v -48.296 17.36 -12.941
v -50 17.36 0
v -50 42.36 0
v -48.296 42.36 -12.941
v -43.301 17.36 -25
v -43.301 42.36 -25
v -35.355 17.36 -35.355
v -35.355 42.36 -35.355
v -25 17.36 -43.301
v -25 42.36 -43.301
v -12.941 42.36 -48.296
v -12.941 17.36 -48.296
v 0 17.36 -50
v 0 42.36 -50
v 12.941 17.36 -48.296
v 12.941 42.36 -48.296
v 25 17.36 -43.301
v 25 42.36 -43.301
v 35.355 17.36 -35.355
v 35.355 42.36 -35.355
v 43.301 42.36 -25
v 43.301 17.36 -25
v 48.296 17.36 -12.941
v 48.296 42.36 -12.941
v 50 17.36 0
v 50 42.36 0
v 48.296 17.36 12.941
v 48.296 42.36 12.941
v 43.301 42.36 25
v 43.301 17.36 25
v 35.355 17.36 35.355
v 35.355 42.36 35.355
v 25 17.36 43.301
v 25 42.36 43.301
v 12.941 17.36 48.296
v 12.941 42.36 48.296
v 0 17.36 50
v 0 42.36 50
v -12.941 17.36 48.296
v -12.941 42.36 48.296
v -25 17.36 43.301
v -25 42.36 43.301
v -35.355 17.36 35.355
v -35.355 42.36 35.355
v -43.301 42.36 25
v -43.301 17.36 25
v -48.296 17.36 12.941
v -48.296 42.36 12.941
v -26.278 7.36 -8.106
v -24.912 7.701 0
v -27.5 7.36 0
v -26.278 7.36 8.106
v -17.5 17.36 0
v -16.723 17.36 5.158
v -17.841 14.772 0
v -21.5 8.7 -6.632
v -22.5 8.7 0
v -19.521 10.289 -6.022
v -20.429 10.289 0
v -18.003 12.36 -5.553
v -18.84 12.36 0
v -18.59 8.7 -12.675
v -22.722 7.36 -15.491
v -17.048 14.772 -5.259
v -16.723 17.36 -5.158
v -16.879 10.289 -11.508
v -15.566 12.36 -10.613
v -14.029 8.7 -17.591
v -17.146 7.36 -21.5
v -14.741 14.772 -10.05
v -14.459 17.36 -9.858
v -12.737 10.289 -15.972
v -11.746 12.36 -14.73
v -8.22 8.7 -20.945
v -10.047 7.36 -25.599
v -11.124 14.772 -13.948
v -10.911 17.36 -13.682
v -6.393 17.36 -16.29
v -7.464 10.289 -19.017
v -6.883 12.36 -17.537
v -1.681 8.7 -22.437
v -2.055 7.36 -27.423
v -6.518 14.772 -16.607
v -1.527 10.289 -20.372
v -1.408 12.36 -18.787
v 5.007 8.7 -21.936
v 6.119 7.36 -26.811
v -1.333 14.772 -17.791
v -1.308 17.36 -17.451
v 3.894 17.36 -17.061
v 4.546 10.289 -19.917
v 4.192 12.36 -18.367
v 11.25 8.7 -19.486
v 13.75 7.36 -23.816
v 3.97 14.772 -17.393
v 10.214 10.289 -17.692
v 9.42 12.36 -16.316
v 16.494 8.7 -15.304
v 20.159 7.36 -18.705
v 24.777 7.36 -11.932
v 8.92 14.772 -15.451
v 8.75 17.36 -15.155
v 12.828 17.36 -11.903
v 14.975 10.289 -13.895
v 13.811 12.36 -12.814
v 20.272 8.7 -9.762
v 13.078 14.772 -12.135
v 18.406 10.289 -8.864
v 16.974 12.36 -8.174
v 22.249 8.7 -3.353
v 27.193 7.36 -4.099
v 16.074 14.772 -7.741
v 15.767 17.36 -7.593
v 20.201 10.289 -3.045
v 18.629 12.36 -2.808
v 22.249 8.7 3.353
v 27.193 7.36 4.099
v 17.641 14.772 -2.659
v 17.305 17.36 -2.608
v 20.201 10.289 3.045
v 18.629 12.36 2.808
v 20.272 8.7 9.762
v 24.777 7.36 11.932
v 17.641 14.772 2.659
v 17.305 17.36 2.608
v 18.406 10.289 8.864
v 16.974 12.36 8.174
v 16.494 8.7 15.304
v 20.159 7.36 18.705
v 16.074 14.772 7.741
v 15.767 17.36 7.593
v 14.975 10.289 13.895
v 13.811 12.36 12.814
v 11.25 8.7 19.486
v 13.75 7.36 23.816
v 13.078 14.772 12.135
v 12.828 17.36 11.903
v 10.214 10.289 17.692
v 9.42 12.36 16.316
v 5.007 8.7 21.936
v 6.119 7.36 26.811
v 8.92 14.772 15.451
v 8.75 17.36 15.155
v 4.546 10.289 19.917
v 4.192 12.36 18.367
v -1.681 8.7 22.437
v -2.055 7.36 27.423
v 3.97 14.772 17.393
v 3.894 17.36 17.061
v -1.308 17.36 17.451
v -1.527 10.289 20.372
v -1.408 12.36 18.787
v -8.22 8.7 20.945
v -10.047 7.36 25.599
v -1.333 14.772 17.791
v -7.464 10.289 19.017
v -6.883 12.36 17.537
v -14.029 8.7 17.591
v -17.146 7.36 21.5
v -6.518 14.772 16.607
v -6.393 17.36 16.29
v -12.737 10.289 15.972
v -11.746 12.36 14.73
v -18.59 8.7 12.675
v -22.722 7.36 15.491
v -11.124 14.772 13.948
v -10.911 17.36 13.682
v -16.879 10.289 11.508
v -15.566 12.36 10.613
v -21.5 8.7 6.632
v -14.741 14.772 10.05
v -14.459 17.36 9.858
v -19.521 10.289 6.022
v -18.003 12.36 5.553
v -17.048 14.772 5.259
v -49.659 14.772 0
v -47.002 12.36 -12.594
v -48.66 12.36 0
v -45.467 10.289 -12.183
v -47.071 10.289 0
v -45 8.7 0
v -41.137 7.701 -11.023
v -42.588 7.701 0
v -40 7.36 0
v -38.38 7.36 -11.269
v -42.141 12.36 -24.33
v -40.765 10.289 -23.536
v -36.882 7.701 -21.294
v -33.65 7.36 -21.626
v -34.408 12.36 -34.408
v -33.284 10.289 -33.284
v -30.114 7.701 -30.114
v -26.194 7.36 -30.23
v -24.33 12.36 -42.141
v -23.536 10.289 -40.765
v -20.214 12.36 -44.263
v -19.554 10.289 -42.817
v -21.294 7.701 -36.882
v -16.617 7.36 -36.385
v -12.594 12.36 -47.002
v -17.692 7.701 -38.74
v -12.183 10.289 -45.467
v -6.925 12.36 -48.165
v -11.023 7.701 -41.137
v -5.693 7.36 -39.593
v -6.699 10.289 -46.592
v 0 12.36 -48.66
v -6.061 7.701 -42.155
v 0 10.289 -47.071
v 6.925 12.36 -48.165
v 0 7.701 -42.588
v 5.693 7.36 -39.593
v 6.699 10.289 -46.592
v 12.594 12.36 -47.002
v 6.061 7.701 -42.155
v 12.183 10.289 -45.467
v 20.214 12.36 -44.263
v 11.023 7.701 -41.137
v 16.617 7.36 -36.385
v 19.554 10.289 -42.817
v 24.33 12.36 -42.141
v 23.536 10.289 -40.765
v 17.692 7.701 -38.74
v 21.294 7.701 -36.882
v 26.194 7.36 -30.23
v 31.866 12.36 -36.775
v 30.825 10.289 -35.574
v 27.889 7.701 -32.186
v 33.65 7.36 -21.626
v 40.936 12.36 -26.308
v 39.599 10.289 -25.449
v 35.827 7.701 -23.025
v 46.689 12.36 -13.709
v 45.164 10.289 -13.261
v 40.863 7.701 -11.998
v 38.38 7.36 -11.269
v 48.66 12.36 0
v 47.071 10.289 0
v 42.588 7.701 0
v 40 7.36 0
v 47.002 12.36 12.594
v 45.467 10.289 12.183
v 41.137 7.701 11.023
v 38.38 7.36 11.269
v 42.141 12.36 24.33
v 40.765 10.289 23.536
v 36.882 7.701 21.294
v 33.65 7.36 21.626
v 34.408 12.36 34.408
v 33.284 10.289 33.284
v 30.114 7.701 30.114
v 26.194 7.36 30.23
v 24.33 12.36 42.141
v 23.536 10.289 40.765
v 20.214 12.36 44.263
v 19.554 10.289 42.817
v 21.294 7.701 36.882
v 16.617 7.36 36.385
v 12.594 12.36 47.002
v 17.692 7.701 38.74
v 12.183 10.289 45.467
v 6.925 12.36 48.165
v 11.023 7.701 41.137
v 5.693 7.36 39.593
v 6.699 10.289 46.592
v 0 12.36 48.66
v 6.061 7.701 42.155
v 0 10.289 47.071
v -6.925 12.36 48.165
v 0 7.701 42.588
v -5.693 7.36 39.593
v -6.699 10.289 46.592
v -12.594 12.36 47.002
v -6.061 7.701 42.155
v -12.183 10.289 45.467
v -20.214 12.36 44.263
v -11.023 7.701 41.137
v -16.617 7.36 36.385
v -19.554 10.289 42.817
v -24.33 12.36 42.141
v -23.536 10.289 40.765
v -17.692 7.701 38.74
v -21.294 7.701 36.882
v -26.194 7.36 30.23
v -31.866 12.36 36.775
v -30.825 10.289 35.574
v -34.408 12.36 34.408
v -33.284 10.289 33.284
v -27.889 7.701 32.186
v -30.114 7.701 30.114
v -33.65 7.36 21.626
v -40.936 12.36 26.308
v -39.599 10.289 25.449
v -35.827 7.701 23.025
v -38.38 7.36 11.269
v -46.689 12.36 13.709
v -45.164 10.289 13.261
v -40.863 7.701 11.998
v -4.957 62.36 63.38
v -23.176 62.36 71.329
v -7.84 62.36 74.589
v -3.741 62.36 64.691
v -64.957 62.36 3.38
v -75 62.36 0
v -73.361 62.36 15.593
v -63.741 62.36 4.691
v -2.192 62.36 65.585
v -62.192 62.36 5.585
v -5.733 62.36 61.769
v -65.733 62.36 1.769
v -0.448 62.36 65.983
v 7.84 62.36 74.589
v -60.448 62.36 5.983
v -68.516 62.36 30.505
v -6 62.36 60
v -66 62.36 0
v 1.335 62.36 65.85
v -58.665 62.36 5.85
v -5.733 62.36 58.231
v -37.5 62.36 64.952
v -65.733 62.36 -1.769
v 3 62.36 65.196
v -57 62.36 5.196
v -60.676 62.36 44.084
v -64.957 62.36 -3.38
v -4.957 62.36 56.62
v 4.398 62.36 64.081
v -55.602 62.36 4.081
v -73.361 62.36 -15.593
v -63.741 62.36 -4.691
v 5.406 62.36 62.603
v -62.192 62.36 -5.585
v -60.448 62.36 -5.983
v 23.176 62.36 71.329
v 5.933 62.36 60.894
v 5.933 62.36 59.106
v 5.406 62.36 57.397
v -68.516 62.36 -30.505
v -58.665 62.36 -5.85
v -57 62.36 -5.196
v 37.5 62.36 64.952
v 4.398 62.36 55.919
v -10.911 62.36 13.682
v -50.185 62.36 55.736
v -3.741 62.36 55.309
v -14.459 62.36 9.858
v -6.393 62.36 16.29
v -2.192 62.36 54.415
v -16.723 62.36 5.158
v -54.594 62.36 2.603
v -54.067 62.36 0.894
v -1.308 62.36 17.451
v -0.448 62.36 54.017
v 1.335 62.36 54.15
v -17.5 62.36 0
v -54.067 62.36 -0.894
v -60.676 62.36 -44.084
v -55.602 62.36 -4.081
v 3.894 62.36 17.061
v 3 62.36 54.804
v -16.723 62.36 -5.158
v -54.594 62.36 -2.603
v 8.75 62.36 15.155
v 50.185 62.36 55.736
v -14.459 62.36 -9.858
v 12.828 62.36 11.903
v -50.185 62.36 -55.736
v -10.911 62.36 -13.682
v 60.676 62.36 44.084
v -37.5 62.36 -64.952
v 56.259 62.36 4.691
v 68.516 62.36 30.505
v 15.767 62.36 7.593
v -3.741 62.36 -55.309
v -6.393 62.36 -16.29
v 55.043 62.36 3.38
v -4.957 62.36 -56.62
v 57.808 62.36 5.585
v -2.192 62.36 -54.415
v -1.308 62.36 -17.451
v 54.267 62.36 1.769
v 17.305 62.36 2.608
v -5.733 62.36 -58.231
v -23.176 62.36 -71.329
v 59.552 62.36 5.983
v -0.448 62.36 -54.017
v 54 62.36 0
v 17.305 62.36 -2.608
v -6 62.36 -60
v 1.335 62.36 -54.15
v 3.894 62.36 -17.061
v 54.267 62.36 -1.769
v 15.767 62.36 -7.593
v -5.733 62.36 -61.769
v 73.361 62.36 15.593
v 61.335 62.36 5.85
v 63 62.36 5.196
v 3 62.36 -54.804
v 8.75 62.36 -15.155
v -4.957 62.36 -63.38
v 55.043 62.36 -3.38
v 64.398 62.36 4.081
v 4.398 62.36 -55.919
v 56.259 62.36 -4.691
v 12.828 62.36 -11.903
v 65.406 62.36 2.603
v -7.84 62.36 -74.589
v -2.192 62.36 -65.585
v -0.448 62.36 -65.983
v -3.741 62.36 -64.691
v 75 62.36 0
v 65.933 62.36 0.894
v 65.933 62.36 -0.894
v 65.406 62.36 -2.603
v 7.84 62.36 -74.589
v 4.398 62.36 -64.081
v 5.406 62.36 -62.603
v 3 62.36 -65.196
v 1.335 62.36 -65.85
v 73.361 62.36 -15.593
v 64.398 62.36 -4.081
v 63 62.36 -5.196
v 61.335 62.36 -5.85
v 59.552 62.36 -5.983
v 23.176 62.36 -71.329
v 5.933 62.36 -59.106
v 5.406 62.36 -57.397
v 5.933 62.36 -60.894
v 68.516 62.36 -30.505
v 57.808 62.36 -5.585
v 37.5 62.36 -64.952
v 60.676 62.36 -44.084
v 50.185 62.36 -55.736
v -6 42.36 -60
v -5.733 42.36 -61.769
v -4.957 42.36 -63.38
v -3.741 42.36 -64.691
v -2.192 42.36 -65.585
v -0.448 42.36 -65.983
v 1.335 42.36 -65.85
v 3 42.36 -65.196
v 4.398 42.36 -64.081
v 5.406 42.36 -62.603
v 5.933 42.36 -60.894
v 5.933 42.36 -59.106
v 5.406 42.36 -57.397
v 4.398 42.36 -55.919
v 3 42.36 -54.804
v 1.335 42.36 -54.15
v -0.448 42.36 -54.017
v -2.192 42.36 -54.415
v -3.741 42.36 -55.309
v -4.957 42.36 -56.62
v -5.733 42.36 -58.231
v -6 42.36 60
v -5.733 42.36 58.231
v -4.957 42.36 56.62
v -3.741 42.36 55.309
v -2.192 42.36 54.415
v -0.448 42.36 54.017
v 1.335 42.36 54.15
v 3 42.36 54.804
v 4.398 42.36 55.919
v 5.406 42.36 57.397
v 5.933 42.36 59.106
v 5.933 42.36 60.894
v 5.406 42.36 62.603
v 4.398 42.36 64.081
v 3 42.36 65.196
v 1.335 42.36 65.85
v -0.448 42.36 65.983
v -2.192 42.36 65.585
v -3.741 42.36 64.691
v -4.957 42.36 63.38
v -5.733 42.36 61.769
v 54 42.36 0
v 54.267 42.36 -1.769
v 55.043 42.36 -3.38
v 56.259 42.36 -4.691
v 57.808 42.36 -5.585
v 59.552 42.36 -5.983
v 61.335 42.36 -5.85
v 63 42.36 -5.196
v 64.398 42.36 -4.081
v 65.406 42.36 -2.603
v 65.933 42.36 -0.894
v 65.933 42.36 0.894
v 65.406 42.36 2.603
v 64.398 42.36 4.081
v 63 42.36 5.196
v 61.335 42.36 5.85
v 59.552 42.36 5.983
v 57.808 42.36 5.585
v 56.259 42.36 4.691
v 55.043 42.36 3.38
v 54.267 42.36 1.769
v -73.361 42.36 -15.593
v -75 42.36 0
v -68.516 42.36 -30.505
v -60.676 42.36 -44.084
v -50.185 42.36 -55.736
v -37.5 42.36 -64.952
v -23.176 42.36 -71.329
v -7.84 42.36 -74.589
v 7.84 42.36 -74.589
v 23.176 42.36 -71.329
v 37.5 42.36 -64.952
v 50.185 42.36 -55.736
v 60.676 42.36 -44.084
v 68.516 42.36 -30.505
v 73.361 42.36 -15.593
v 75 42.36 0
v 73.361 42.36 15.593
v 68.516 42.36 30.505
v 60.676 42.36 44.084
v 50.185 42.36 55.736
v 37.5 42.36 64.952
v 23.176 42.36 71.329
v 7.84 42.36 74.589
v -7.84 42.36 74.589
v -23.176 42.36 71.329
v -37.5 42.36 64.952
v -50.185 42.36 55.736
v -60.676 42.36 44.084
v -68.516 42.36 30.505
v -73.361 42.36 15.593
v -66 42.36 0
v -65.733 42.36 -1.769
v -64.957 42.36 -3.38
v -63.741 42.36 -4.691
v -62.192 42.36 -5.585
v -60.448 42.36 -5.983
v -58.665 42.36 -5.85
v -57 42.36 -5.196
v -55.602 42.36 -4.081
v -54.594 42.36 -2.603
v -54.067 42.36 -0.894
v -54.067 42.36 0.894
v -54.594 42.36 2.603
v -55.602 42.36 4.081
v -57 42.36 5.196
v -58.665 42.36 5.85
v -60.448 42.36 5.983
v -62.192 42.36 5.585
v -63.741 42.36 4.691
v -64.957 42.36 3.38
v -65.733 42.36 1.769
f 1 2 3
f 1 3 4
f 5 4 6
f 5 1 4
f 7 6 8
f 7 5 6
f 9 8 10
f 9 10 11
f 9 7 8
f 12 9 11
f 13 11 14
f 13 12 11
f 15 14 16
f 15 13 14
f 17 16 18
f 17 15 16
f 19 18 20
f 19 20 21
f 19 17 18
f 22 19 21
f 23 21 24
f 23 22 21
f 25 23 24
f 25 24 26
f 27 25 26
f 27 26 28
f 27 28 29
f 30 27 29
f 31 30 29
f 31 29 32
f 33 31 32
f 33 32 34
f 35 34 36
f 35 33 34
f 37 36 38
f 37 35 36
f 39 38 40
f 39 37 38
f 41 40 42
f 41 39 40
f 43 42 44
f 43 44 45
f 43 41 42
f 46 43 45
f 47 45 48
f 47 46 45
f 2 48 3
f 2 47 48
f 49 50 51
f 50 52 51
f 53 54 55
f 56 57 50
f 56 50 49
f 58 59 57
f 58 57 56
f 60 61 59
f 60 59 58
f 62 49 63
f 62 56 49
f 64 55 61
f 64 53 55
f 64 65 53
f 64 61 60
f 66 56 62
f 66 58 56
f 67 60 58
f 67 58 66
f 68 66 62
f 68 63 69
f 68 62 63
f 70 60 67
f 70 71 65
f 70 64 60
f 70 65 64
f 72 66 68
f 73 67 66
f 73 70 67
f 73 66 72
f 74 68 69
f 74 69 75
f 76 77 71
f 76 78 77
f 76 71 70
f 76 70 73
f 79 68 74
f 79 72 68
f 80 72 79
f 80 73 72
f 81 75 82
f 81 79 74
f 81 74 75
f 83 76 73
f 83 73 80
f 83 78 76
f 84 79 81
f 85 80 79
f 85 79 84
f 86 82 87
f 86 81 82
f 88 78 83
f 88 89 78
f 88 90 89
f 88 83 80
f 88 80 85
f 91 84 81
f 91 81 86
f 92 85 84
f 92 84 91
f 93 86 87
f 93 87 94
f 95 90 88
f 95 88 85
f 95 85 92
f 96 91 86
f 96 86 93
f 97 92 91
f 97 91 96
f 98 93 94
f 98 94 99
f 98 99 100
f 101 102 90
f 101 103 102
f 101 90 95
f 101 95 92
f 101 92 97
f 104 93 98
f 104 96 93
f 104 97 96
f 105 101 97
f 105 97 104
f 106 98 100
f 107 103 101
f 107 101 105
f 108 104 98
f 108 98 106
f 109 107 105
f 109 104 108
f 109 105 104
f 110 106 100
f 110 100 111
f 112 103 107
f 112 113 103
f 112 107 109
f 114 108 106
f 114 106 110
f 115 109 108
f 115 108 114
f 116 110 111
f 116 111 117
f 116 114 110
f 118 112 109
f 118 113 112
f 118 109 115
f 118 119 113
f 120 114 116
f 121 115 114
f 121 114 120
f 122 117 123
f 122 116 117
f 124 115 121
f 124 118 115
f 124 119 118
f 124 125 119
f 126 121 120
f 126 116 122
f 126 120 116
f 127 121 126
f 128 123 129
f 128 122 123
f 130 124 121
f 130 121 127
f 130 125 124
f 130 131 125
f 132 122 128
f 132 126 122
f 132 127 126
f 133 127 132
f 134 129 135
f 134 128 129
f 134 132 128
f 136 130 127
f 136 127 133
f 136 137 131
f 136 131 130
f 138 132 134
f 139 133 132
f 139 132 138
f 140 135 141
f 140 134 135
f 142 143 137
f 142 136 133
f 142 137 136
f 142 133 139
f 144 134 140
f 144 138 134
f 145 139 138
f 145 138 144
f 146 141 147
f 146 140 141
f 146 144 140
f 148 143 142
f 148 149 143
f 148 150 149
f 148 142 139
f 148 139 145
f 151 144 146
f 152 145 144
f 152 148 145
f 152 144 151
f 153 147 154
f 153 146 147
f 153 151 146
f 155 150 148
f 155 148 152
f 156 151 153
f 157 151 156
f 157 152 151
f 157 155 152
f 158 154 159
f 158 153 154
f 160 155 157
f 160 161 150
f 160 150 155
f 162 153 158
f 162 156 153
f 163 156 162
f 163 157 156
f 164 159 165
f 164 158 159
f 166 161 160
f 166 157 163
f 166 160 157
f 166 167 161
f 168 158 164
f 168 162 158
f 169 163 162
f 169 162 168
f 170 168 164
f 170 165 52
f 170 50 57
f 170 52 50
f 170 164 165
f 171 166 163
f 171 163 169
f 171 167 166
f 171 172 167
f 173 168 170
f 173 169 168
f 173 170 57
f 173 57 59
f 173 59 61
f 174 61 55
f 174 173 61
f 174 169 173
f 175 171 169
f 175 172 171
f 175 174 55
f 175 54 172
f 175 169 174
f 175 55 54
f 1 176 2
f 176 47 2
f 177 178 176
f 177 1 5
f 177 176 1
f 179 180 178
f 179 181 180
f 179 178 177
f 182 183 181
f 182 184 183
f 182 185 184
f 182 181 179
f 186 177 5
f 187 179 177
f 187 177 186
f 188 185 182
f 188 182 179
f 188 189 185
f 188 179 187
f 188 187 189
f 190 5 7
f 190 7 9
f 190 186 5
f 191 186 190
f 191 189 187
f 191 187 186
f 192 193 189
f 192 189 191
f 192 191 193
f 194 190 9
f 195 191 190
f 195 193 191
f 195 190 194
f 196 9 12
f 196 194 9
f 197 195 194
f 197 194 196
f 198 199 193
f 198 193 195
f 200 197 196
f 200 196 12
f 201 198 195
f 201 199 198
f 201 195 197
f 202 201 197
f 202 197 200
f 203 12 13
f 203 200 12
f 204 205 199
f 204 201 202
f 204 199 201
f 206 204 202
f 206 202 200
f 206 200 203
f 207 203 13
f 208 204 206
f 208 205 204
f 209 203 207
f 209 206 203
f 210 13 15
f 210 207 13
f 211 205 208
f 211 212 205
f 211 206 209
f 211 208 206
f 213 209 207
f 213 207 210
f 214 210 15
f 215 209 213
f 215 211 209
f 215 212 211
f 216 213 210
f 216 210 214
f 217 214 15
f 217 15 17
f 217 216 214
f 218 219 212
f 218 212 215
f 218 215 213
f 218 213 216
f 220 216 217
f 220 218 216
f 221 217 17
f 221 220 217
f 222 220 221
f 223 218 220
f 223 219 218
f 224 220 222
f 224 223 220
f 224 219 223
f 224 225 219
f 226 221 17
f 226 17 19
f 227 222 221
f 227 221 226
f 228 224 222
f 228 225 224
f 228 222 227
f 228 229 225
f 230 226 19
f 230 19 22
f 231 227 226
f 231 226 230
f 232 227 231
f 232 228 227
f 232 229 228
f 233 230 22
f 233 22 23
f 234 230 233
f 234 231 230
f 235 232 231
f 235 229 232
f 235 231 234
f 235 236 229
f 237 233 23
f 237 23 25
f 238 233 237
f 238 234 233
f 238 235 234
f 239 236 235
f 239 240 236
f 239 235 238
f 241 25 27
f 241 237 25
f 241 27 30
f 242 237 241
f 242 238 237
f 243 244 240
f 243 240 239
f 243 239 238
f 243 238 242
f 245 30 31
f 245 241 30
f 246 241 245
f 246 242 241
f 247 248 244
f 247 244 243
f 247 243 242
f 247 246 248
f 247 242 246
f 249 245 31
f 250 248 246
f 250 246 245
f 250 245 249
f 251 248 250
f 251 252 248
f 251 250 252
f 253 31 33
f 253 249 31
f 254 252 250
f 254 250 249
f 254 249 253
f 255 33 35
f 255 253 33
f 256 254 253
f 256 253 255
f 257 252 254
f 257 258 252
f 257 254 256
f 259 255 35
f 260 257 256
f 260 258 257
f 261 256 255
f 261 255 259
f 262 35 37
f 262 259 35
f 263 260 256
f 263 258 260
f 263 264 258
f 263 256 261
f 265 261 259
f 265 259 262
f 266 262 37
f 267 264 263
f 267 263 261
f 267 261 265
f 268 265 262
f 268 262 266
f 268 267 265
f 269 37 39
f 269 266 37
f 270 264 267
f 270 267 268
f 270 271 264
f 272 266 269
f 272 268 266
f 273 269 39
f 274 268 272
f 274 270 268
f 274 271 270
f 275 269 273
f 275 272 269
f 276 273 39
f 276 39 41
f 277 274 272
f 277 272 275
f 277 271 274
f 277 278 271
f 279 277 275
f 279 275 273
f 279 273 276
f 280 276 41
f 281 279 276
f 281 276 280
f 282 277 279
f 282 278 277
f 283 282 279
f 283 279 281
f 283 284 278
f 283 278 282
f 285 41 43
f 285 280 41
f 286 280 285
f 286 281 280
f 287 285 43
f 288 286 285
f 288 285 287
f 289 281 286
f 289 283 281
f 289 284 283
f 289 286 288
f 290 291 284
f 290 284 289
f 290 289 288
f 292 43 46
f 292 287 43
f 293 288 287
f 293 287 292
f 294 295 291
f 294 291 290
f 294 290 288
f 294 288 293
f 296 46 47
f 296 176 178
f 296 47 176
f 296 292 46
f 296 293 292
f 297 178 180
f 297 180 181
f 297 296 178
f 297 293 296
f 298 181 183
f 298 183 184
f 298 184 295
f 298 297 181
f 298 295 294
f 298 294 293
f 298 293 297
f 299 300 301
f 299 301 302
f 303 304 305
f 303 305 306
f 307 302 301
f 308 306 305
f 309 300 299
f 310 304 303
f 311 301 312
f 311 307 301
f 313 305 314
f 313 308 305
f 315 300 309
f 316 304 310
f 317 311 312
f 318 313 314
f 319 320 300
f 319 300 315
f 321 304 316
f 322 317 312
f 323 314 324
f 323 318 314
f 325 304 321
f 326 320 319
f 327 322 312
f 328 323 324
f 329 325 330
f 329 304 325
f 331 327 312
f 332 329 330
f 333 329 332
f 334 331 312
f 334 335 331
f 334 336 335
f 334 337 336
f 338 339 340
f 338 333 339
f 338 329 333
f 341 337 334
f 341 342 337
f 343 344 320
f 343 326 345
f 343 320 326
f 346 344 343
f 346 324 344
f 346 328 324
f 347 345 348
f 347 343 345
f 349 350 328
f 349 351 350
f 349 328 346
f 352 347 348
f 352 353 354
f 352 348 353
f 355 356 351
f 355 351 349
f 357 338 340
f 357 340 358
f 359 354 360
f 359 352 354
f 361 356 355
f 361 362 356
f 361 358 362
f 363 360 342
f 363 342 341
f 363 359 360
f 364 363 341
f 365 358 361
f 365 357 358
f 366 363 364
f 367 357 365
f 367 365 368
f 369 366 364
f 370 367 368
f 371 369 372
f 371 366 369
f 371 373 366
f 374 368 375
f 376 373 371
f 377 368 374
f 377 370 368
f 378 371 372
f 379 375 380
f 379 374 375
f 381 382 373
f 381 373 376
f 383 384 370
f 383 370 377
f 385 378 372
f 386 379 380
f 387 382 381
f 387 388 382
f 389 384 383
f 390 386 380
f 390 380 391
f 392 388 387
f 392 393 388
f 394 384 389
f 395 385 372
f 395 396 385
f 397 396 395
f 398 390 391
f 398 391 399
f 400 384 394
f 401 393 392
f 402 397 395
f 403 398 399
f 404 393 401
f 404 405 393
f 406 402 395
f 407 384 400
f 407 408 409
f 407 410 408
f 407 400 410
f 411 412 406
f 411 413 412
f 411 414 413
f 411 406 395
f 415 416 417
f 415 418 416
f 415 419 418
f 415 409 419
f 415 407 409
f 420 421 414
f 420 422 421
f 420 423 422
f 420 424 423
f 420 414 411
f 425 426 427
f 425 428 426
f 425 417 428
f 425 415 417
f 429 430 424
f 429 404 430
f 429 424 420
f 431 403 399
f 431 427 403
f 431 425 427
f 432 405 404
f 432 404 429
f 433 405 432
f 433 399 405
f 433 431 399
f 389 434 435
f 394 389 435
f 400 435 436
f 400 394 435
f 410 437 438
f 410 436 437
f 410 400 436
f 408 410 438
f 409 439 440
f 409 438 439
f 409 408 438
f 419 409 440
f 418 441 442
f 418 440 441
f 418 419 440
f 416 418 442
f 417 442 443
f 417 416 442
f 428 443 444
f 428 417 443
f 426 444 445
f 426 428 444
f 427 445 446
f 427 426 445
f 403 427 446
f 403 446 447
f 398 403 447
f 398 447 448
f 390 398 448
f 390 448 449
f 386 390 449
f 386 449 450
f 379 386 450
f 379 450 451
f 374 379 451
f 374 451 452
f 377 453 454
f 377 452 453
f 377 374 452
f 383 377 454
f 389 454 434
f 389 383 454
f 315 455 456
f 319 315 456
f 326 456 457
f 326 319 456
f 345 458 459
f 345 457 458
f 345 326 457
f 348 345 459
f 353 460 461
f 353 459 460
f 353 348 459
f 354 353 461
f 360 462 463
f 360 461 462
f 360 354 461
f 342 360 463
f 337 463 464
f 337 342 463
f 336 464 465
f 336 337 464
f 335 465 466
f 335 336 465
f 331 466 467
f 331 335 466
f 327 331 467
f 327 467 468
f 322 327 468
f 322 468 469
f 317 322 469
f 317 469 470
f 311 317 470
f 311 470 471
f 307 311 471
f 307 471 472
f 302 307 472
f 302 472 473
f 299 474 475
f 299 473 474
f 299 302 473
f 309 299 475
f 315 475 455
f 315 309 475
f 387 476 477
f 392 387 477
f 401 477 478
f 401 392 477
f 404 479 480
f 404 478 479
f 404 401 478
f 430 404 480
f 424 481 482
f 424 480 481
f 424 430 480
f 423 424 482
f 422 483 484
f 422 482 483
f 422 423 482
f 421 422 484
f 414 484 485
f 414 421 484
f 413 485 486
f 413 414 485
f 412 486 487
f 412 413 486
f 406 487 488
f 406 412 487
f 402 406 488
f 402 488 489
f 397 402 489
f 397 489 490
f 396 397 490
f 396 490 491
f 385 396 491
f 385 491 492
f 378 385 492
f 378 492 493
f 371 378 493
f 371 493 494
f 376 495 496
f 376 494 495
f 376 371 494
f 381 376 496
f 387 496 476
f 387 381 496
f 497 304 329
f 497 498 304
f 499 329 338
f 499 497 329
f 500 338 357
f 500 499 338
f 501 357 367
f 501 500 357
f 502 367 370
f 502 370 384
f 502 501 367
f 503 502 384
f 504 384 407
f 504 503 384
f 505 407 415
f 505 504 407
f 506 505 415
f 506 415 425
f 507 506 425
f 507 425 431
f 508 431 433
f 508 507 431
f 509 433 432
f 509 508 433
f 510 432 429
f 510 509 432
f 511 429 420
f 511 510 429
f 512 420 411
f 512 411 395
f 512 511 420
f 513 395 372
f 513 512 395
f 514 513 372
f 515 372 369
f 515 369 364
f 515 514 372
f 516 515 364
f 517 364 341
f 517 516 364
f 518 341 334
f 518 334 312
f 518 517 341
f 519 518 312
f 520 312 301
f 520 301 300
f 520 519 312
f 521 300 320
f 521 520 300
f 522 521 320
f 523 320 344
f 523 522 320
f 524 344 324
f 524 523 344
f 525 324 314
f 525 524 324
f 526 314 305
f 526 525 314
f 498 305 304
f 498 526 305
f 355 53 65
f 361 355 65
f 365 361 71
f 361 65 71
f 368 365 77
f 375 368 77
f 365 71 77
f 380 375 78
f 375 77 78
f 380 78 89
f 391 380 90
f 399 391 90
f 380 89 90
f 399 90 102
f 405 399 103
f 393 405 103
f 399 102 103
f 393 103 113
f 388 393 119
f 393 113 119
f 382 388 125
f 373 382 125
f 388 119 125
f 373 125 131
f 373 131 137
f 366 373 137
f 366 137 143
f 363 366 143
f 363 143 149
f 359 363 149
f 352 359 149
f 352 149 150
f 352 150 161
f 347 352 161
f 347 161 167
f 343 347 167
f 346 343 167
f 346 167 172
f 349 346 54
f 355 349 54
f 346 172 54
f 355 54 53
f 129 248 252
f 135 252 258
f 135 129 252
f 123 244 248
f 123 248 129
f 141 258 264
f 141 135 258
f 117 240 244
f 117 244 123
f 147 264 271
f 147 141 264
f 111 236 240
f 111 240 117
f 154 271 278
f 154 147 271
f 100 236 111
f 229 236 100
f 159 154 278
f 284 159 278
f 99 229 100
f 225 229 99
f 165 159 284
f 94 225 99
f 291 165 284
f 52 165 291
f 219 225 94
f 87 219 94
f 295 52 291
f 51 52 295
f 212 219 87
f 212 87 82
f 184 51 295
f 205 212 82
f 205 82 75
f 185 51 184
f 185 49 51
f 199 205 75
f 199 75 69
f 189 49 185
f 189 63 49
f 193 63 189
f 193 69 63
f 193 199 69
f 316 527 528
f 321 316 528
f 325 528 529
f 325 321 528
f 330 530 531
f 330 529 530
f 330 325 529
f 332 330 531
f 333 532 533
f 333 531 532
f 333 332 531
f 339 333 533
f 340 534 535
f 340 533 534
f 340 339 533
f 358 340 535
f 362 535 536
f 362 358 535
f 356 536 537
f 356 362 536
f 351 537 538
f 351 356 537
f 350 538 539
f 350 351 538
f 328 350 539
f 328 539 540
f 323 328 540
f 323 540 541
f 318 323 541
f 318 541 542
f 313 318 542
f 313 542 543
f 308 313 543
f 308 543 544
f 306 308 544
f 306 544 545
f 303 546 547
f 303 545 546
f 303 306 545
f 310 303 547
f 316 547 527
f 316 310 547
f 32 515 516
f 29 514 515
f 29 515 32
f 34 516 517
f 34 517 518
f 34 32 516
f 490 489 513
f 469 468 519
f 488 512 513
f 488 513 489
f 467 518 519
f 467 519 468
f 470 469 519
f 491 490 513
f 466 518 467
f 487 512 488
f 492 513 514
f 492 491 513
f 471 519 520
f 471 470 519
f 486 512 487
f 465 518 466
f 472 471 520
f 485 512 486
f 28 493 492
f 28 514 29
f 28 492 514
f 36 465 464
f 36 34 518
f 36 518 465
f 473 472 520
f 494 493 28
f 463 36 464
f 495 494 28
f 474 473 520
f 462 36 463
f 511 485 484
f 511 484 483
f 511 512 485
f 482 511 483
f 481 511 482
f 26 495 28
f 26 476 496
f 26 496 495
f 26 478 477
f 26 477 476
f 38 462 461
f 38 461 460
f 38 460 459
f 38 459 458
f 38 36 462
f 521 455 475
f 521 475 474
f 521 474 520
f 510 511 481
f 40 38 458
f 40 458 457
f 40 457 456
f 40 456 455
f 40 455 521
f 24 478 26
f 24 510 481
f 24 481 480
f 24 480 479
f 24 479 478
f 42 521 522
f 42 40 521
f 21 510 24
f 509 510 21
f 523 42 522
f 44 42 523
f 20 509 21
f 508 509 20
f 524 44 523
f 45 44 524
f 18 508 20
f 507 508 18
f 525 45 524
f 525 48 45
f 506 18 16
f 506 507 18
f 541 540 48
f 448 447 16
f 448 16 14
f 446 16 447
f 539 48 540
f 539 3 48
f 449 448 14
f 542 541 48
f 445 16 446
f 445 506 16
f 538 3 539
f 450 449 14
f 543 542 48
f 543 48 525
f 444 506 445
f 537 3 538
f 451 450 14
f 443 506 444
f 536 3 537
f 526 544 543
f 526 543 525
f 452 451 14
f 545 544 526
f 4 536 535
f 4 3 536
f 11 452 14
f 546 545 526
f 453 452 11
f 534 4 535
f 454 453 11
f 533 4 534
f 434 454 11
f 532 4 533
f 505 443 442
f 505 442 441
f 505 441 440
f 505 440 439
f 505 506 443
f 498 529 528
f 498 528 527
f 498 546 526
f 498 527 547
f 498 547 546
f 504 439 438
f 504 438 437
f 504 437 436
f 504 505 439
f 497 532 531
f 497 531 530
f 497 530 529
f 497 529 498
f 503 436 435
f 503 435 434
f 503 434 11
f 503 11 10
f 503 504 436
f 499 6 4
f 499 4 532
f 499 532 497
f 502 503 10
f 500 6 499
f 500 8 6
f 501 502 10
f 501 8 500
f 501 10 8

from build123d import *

# Parameters (mm, degrees)
CORTAR_EXTRUIR1_DEPTH      = 112.691539518
CORTAR_EXTRUIR1_DEPTH_BACK = 29
CROQUIS4_R                 = 6
REDONDEO3_R                = 10


with BuildPart() as part:
    # Croquis1 → Revolución1 (revolve)
    with BuildSketch(Plane.XY, mode=Mode.PRIVATE) as revoluci_n1_sk:
        Polygon((75, 42.359797144), (50, 42.359797144), (50, 7.359797144), (17.5, 7.359797144), (17.5, 42.359797144), (17.5, 62.359797144), (75, 62.359797144), align=None)
    revolve(revoluci_n1_sk.sketch.rotate(Axis((0, 71.893155669, 0), (0, -1, 0)), 180), axis=Axis((0, 71.893155669, 0), (0, -1, 0)))

    # Croquis4 → Cortar-Extruir1 (cut, two sides: drawn at the far end of the back side and taken through both)
    with BuildSketch(Plane.XZ.offset(-42.359797144).offset(-CORTAR_EXTRUIR1_DEPTH_BACK)):
        with Locations(Location((0, 60, 0), (0, 0, 180))):
            Circle(CROQUIS4_R)
        with Locations(Location((60, 0, 0), (0, 0, 180))):
            Circle(CROQUIS4_R)
        with Locations(Location((0, -60, 0), (0, 0, 180))):
            Circle(CROQUIS4_R)
        with Locations(Location((-60, 0, 0), (0, 0, 180))):
            Circle(CROQUIS4_R)
    extrude(amount=CORTAR_EXTRUIR1_DEPTH + CORTAR_EXTRUIR1_DEPTH_BACK, mode=Mode.SUBTRACT)

    # Redondeo3
    redondeo3_edges = [part.edges().sort_by_distance(p)[0] for p in [
        (17.5, 7.359797144, 0),
        (50, 7.359797144, 0),
    ]]
    fillet(redondeo3_edges, radius=REDONDEO3_R)


solid = part.part
